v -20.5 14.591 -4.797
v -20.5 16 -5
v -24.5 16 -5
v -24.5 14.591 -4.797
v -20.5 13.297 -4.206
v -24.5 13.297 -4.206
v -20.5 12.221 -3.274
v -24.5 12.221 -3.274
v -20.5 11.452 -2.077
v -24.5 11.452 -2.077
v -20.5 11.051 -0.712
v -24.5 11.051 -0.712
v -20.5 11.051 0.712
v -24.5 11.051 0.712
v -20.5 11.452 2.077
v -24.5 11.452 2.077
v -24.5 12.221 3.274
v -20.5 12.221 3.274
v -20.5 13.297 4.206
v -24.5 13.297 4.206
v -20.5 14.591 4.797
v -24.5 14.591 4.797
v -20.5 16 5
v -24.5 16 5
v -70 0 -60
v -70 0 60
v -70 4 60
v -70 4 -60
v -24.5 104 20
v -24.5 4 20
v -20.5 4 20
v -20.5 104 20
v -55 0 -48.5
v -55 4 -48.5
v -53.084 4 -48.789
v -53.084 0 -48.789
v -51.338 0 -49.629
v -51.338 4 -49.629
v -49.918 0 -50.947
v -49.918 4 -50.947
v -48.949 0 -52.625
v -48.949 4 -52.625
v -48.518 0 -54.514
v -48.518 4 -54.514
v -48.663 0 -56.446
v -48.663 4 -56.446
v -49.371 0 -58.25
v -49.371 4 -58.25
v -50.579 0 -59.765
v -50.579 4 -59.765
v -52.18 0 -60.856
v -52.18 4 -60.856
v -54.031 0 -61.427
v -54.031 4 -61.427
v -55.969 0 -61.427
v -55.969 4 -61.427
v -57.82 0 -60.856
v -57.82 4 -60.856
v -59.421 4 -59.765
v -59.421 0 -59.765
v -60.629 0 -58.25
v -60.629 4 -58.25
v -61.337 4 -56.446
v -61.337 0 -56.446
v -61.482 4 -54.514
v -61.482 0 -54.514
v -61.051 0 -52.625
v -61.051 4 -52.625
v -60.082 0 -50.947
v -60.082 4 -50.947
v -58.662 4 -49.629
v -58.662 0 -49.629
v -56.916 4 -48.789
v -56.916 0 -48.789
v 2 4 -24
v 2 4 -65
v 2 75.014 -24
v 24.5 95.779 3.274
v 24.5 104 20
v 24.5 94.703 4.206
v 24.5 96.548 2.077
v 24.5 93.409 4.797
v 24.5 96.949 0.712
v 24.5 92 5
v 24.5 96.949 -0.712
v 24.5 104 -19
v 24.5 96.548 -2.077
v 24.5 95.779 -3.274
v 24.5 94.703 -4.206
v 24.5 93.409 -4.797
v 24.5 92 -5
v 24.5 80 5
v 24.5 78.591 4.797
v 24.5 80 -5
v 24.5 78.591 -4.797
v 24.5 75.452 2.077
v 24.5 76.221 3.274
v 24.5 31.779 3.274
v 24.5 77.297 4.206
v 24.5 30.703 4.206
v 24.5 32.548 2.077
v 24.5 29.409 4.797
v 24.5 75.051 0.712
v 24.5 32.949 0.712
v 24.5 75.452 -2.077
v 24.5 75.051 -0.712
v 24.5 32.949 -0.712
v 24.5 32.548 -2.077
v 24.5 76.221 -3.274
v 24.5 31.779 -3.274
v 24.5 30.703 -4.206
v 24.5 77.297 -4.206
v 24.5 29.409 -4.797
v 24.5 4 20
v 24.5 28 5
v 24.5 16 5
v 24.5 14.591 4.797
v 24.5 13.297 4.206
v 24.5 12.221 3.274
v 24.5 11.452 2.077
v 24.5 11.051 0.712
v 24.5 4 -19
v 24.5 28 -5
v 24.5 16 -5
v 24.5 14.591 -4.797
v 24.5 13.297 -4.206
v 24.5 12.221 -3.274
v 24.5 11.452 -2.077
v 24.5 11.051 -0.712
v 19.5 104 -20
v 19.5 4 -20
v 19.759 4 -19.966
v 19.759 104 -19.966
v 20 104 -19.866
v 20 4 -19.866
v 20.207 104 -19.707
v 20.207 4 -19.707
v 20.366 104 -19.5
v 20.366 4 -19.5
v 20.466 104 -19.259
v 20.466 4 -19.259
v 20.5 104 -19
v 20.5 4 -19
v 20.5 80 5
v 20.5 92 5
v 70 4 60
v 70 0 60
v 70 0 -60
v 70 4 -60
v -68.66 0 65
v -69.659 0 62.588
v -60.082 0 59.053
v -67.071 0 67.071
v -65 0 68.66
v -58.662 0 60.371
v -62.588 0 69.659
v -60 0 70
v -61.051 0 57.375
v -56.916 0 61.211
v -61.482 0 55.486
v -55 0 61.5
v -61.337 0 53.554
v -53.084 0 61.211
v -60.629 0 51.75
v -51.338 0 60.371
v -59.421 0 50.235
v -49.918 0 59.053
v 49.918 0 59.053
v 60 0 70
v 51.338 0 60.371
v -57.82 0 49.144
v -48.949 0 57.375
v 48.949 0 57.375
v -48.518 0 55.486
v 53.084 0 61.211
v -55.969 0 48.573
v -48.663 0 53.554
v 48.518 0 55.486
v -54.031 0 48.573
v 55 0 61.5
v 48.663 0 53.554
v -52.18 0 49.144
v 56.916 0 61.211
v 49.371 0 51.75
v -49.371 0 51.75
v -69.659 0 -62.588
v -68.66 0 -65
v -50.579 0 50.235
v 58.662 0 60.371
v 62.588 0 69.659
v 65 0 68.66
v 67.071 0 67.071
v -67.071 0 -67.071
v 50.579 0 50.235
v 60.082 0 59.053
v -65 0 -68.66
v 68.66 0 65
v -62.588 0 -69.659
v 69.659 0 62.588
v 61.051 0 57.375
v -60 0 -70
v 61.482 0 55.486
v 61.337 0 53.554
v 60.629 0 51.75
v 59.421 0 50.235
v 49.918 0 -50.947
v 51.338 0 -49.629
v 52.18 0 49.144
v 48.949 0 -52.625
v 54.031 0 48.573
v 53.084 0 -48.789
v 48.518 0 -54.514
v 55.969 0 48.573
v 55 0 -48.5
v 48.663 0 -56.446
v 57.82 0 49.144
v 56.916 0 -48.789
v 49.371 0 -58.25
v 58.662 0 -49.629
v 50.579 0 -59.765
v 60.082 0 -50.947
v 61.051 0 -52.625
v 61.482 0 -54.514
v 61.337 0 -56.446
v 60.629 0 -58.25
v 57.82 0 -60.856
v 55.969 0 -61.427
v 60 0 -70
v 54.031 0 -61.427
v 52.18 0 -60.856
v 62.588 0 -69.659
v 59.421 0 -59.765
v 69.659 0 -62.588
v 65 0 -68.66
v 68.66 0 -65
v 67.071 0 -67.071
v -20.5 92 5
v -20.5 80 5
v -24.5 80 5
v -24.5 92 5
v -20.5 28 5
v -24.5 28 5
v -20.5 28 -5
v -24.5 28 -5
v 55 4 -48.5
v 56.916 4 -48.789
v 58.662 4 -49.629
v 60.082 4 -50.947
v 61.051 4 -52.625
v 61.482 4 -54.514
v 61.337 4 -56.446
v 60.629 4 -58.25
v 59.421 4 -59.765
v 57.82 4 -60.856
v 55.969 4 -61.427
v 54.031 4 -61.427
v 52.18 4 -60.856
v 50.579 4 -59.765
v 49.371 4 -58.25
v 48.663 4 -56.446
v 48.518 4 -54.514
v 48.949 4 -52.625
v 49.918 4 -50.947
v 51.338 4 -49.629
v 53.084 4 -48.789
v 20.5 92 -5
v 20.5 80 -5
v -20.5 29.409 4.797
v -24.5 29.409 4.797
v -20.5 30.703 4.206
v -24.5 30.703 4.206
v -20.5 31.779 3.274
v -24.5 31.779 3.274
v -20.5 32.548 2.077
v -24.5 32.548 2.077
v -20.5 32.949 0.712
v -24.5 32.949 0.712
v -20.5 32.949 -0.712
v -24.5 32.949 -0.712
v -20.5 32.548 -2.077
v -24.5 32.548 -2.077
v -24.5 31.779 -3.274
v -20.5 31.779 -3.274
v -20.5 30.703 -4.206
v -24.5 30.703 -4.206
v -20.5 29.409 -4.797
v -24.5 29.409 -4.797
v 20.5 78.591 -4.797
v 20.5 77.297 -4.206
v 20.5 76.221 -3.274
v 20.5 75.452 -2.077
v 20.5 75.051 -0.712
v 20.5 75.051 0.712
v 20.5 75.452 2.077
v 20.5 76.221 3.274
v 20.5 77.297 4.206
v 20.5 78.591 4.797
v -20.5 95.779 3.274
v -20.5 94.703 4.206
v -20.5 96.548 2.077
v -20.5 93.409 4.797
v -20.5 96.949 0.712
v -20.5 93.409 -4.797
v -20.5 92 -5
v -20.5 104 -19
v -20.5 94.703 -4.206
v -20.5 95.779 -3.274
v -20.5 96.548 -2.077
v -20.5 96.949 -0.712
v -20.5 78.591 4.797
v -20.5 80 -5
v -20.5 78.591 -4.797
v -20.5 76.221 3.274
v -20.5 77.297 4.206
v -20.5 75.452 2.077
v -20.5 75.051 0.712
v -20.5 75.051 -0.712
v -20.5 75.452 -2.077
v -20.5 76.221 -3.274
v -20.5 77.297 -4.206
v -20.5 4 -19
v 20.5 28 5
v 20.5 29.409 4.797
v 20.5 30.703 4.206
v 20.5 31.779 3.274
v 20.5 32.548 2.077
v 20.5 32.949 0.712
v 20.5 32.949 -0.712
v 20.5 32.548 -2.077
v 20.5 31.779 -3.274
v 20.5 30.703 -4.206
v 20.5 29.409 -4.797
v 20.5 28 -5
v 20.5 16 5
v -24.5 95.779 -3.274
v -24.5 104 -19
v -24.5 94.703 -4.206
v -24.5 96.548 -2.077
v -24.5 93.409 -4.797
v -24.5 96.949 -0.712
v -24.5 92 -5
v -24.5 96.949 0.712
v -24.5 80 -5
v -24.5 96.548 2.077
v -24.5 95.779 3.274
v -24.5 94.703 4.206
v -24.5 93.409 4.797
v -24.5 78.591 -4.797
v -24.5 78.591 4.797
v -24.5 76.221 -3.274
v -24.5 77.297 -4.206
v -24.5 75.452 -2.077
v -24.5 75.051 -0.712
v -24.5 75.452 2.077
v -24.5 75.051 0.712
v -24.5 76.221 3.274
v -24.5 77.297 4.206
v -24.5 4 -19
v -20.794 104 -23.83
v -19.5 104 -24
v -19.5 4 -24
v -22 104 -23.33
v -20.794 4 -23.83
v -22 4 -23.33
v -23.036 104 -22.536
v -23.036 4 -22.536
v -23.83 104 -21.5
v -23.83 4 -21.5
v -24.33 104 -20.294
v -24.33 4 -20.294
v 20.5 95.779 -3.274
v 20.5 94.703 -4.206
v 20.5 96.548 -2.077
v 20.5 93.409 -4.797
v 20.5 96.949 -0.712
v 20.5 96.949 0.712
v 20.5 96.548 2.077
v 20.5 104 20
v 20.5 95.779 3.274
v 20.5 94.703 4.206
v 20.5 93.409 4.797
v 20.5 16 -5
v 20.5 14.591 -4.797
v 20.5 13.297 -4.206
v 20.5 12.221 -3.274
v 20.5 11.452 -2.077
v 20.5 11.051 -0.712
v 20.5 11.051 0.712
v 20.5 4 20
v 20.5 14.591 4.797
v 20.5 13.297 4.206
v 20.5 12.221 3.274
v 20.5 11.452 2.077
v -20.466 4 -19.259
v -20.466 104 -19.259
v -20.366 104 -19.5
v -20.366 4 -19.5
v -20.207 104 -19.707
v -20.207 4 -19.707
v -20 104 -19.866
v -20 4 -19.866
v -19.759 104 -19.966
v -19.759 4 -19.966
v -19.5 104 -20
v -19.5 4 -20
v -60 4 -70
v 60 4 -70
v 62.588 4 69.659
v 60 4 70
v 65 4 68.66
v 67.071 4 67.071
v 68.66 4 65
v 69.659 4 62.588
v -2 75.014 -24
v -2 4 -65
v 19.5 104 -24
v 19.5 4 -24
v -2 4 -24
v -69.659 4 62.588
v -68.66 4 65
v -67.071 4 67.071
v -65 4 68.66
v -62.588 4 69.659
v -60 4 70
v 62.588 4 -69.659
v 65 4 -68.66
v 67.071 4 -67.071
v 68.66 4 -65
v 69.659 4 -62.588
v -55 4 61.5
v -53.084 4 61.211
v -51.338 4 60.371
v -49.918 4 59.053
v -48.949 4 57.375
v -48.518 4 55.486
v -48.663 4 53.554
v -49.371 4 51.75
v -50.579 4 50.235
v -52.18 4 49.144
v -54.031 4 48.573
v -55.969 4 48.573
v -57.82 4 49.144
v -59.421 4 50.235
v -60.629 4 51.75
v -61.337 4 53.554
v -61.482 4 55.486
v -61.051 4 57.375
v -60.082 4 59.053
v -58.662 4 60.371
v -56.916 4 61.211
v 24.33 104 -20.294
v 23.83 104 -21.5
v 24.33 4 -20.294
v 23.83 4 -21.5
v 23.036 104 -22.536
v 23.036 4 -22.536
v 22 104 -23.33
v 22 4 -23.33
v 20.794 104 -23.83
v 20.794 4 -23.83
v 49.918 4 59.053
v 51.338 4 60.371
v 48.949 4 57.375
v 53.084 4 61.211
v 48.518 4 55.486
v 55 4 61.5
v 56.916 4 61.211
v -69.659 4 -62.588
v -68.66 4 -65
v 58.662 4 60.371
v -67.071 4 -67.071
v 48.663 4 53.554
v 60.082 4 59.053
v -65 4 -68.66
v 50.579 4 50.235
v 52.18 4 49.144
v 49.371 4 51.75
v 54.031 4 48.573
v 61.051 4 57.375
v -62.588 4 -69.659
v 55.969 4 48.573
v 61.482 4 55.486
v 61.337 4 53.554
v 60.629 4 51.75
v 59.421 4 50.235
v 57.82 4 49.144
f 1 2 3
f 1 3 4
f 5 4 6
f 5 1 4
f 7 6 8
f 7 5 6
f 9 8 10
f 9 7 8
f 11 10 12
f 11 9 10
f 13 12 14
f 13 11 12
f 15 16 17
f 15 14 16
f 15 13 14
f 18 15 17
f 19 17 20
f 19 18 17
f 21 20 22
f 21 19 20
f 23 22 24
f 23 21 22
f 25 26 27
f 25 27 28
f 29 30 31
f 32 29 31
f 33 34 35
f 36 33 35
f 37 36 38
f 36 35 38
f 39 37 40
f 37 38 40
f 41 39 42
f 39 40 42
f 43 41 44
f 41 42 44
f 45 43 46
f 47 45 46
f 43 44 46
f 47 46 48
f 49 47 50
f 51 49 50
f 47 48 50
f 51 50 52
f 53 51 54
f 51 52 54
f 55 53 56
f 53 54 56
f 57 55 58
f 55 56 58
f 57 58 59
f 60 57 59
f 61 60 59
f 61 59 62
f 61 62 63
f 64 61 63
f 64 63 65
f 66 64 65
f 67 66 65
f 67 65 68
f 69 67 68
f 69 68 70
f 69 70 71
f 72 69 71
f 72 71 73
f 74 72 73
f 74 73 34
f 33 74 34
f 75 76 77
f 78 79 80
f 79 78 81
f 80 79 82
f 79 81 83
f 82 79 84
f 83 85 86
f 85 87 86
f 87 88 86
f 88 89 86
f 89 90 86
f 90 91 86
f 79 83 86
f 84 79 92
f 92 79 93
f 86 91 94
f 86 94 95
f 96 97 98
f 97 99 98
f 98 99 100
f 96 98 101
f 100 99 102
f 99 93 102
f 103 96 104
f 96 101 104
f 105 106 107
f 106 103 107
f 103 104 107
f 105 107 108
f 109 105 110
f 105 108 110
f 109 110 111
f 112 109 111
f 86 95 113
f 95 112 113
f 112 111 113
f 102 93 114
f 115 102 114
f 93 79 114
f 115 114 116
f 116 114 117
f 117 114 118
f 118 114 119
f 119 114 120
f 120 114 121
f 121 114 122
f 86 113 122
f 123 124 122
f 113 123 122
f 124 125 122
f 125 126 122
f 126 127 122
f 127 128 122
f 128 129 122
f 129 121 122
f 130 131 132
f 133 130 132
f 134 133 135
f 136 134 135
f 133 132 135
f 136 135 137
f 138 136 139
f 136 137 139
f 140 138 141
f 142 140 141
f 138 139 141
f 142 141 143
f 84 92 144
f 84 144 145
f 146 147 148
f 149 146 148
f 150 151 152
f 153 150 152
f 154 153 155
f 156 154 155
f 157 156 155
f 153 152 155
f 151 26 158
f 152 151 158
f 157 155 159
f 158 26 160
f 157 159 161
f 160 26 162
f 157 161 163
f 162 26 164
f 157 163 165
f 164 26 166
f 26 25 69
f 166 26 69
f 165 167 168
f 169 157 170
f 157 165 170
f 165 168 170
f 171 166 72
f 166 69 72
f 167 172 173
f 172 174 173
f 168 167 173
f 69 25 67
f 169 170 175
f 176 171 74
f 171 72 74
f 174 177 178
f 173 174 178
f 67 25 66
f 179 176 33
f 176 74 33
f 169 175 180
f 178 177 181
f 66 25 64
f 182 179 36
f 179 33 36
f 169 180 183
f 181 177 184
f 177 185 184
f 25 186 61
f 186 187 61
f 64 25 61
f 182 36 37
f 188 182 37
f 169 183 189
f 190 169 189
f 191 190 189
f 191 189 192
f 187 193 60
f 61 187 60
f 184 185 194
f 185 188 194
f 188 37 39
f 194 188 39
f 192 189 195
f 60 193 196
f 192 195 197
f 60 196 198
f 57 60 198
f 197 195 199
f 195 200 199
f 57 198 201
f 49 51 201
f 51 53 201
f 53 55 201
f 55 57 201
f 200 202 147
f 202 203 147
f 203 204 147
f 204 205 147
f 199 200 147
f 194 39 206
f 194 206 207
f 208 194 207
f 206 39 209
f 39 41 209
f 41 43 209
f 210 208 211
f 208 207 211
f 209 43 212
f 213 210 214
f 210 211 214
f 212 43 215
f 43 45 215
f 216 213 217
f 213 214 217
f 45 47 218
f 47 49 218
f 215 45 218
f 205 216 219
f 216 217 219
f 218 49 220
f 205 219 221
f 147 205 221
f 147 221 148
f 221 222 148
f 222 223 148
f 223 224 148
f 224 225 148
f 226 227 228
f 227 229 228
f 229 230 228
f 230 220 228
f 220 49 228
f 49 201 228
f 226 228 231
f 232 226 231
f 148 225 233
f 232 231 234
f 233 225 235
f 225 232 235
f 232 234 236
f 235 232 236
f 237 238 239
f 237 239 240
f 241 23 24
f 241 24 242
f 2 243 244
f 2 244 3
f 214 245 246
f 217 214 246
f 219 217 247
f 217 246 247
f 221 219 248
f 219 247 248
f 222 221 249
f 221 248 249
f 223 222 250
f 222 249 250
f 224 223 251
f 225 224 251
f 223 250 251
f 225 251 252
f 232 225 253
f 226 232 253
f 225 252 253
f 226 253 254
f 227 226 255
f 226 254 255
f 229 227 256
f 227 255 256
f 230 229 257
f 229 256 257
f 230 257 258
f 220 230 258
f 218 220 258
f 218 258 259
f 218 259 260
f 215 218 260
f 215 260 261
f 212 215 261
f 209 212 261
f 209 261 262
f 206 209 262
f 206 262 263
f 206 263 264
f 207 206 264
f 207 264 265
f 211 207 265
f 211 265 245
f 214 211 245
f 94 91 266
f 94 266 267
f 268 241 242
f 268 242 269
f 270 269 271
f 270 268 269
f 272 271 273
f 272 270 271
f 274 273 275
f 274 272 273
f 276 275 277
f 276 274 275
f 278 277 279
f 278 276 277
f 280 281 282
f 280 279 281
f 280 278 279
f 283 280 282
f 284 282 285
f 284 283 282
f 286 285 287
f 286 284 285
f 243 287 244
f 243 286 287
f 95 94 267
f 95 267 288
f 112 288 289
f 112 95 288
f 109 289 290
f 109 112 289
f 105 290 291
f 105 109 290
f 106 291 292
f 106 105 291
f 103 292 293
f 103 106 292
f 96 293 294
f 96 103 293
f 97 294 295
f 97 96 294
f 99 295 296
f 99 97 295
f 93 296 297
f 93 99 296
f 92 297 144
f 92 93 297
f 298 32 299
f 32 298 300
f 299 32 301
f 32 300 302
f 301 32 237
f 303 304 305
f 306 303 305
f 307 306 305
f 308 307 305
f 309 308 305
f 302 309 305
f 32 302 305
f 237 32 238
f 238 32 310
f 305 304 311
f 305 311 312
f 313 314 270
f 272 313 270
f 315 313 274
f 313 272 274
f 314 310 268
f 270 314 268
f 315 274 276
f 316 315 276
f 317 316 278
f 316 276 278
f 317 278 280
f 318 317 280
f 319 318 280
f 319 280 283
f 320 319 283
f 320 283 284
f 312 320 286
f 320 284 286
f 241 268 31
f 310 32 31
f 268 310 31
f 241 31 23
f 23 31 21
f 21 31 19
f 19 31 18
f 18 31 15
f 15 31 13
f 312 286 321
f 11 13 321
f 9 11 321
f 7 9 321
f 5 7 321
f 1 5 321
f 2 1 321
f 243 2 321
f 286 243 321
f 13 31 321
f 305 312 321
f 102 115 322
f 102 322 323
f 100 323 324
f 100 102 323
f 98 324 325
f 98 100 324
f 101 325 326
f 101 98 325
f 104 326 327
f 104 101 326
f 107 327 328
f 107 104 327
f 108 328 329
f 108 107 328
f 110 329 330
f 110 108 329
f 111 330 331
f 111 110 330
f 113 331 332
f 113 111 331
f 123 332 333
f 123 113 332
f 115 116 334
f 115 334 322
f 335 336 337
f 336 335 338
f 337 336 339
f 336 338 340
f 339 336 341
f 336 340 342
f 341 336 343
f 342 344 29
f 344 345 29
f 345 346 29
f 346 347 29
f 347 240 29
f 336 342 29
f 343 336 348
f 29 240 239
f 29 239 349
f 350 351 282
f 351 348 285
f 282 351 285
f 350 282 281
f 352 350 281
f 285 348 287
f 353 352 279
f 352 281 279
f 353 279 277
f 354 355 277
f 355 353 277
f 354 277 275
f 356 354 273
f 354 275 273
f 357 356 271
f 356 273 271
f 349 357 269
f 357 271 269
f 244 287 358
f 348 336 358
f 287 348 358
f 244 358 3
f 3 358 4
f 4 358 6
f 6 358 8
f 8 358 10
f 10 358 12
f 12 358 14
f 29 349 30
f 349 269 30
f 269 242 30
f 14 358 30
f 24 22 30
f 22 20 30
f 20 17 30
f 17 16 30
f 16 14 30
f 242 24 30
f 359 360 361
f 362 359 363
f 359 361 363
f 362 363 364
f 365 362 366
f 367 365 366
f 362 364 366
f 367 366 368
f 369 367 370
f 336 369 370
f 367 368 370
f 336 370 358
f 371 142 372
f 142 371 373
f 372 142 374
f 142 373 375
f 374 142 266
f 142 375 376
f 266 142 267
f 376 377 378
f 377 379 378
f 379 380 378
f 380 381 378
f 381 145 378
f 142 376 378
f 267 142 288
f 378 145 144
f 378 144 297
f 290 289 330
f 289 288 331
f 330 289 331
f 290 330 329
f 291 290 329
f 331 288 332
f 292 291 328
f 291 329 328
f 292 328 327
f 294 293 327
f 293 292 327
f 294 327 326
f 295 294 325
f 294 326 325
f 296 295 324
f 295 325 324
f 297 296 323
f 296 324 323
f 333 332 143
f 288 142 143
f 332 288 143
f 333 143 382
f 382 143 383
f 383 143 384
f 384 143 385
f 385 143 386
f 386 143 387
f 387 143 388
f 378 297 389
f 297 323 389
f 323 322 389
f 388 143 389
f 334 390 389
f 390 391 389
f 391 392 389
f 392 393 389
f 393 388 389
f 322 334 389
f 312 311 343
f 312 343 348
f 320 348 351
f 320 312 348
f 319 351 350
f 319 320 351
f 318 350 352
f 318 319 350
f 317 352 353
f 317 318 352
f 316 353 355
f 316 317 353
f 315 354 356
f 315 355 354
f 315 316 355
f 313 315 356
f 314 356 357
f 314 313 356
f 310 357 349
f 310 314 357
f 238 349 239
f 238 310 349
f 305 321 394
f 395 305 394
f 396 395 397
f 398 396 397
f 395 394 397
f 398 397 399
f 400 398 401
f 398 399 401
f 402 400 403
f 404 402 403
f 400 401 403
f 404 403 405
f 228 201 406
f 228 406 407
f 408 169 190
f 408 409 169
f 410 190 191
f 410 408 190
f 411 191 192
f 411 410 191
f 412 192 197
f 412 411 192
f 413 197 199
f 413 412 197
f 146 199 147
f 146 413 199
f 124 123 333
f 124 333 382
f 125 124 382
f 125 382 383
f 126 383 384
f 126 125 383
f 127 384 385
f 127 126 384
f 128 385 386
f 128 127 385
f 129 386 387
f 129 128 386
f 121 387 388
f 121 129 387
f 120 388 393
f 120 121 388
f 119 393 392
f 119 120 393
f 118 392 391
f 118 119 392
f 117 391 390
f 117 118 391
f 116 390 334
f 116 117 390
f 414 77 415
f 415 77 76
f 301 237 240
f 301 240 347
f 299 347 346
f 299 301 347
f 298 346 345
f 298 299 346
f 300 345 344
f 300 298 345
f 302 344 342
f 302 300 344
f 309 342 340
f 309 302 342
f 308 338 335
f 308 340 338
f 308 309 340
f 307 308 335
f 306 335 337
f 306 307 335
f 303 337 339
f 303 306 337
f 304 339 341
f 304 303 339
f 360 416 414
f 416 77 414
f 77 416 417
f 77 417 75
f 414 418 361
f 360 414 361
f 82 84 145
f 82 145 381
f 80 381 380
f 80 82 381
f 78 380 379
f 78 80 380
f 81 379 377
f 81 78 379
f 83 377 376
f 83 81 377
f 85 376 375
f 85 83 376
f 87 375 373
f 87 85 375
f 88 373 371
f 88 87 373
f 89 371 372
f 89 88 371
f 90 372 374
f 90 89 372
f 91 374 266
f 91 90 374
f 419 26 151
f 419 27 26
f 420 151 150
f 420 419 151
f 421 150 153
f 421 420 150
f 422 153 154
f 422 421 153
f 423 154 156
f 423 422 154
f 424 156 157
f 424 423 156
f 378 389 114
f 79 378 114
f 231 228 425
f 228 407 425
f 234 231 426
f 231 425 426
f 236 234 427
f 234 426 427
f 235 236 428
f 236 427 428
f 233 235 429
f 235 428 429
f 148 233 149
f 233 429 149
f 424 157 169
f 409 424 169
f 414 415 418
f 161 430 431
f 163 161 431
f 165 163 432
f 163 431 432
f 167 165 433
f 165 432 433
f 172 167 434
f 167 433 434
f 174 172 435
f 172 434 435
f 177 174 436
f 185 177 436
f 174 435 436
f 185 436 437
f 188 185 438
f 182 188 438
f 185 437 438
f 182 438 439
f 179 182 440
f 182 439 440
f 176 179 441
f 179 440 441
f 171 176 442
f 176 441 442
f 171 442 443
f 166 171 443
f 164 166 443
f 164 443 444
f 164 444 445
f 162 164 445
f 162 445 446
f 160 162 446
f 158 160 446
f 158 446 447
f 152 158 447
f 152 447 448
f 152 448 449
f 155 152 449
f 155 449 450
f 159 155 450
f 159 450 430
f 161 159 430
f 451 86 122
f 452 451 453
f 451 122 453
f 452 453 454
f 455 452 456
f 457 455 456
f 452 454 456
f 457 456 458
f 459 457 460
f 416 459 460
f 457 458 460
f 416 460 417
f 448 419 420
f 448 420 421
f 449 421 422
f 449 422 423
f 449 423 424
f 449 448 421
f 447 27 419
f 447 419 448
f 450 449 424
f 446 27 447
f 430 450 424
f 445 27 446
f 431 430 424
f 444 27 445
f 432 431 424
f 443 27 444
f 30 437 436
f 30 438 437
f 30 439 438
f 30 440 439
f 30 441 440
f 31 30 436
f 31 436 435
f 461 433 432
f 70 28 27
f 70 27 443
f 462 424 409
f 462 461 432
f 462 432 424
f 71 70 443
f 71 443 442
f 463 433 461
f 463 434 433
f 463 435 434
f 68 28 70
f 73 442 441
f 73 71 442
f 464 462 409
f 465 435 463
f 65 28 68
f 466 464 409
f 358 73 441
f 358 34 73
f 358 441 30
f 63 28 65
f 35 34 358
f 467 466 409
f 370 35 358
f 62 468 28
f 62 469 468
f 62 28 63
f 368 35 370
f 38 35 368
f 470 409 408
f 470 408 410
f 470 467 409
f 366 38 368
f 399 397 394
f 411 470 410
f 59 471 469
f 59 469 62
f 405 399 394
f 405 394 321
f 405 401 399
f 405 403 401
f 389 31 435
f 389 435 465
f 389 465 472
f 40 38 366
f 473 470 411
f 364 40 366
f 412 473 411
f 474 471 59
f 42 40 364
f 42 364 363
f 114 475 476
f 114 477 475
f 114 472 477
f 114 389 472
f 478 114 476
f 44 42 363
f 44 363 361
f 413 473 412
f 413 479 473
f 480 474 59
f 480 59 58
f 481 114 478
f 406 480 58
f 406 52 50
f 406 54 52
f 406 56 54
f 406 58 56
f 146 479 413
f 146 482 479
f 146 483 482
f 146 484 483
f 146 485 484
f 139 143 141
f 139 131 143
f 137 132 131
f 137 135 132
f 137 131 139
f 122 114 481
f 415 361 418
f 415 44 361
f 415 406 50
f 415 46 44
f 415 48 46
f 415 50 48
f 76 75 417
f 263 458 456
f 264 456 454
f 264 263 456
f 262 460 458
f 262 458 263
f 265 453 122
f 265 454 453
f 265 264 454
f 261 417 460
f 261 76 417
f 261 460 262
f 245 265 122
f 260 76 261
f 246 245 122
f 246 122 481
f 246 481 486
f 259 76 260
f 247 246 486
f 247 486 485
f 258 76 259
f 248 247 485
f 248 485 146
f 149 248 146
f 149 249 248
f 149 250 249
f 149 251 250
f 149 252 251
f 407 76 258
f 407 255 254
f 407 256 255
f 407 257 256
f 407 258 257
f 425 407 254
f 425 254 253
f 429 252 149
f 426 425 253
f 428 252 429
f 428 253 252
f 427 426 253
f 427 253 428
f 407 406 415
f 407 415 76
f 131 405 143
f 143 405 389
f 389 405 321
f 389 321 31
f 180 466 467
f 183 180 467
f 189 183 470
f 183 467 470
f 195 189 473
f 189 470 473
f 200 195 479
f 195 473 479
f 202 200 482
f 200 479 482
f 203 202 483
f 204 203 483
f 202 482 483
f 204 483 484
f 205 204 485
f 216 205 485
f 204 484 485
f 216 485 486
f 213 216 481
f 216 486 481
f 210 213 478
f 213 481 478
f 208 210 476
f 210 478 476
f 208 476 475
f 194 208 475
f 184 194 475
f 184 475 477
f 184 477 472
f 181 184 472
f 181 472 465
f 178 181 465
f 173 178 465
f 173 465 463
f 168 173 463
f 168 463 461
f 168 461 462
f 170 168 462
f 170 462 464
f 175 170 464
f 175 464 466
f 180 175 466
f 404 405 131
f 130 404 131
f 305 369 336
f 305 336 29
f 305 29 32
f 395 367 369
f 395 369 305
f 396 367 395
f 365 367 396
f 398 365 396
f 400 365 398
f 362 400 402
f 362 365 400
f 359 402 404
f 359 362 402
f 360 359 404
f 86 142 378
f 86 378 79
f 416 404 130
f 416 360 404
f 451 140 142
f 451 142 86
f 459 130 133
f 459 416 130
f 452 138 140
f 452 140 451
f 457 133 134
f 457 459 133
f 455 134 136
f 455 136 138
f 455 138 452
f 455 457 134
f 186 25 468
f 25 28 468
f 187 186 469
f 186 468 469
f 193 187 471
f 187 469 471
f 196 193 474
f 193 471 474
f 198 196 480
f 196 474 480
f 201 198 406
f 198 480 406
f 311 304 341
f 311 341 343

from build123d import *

# Parameters (mm, degrees)
SKETCH_2_W          = 140
SKETCH_2_H          = 140
EXTRUDE_1_DEPTH     = 4
EXTRUDE_1_2_DEPTH   = 100
EXTRUDE_2_DEPTH     = 2
CUT_EXTRUDE_1_DEPTH = 95.5
SKETCH_6_R          = 6.5
CUT_EXTRUDE_2_DEPTH = 5
FILLET_1_R          = 10


with BuildPart() as part:
    # Эскиз2 → Extrude 1 (new body)
    with BuildSketch(Plane(origin=(0, 0, 0), x_dir=(1, 0, 0), z_dir=(0, 1, 0))):
        Rectangle(SKETCH_2_W, SKETCH_2_H)
    extrude(amount=EXTRUDE_1_DEPTH)

    # Эскиз3 → Extrude 1 2 (add)
    with BuildSketch(Plane(origin=(0, 4, 0), x_dir=(1, 0, 0), z_dir=(0, 1, 0))):
        with BuildLine():
            Line((-20.5, -20), (-20.5, 19))
            ThreePointArc((-20.5, 19), (-20.207106781, 19.707106781), (-19.5, 20))
            Line((-19.5, 20), (19.5, 20))
            ThreePointArc((19.5, 20), (20.207106781, 19.707106781), (20.5, 19))
            Line((20.5, 19), (20.5, -20))
            Line((20.5, -20), (24.5, -20))
            Line((24.5, -20), (24.5, 19))
            ThreePointArc((24.5, 19), (23.035533906, 22.535533906), (19.5, 24))
            Line((19.5, 24), (-19.5, 24))
            ThreePointArc((-19.5, 24), (-23.035533906, 22.535533906), (-24.5, 19))
            Line((-24.5, 19), (-24.5, -20))
            Line((-24.5, -20), (-20.5, -20))
        make_face()
    extrude(amount=EXTRUDE_1_2_DEPTH)

    # Эскиз4 → Бобышка-Вытянуть2 (add, symmetric)
    with BuildSketch(Plane(origin=(0, 0, 0), x_dir=(0, 0, -1), z_dir=(1, 0, 0))):
        Polygon((24, 75.01408311), (65, 4), (24, 4), align=None)
    extrude(amount=EXTRUDE_2_DEPTH, both=True)

    # Эскиз5 → Вырез-Вытянуть1 (cut, through all)
    with BuildSketch(Plane(origin=(24.5, 0, 0), x_dir=(0, 0, -1), z_dir=(1, 0, 0))):
        with BuildLine():
            Line((5, 92), (5, 80))
            ThreePointArc((5, 80), (0, 75), (-5, 80))
            Line((-5, 80), (-5, 92))
            ThreePointArc((-5, 92), (0, 97), (5, 92))
        make_face()
        with BuildLine():
            Line((5, 28), (5, 16))
            ThreePointArc((5, 16), (0, 11), (-5, 16))
            Line((-5, 16), (-5, 28))
            ThreePointArc((-5, 28), (0, 33), (5, 28))
        make_face()
    extrude(amount=-CUT_EXTRUDE_1_DEPTH, mode=Mode.SUBTRACT)

    # Эскиз6 → Вырез-Вытянуть2 (cut, through all)
    with BuildSketch(Plane(origin=(0, 4, 0), x_dir=(1, 0, 0), z_dir=(0, 1, 0))):
        with Locations(Location((-55, 55, 0), (0, 0, 270))):  # turned: the seam where the file's is
            Circle(SKETCH_6_R)
        with Locations(Location((-55, -55, 0), (0, 0, 270))):  # turned: the seam where the file's is
            Circle(SKETCH_6_R)
        with Locations(Location((55, 55, 0), (0, 0, 270))):  # turned: the seam where the file's is
            Circle(SKETCH_6_R)
        with Locations(Location((55, -55, 0), (0, 0, 270))):  # turned: the seam where the file's is
            Circle(SKETCH_6_R)
    extrude(amount=-CUT_EXTRUDE_2_DEPTH, mode=Mode.SUBTRACT)

    # Скругление1
    fillet_1_edges = [part.edges().sort_by_distance(p)[0] for p in [
        (70, 2, 70),
        (-70, 2, 70),
        (-70, 2, -70),
        (70, 2, -70),
    ]]
    fillet(fillet_1_edges, radius=FILLET_1_R)


solid = part.part
